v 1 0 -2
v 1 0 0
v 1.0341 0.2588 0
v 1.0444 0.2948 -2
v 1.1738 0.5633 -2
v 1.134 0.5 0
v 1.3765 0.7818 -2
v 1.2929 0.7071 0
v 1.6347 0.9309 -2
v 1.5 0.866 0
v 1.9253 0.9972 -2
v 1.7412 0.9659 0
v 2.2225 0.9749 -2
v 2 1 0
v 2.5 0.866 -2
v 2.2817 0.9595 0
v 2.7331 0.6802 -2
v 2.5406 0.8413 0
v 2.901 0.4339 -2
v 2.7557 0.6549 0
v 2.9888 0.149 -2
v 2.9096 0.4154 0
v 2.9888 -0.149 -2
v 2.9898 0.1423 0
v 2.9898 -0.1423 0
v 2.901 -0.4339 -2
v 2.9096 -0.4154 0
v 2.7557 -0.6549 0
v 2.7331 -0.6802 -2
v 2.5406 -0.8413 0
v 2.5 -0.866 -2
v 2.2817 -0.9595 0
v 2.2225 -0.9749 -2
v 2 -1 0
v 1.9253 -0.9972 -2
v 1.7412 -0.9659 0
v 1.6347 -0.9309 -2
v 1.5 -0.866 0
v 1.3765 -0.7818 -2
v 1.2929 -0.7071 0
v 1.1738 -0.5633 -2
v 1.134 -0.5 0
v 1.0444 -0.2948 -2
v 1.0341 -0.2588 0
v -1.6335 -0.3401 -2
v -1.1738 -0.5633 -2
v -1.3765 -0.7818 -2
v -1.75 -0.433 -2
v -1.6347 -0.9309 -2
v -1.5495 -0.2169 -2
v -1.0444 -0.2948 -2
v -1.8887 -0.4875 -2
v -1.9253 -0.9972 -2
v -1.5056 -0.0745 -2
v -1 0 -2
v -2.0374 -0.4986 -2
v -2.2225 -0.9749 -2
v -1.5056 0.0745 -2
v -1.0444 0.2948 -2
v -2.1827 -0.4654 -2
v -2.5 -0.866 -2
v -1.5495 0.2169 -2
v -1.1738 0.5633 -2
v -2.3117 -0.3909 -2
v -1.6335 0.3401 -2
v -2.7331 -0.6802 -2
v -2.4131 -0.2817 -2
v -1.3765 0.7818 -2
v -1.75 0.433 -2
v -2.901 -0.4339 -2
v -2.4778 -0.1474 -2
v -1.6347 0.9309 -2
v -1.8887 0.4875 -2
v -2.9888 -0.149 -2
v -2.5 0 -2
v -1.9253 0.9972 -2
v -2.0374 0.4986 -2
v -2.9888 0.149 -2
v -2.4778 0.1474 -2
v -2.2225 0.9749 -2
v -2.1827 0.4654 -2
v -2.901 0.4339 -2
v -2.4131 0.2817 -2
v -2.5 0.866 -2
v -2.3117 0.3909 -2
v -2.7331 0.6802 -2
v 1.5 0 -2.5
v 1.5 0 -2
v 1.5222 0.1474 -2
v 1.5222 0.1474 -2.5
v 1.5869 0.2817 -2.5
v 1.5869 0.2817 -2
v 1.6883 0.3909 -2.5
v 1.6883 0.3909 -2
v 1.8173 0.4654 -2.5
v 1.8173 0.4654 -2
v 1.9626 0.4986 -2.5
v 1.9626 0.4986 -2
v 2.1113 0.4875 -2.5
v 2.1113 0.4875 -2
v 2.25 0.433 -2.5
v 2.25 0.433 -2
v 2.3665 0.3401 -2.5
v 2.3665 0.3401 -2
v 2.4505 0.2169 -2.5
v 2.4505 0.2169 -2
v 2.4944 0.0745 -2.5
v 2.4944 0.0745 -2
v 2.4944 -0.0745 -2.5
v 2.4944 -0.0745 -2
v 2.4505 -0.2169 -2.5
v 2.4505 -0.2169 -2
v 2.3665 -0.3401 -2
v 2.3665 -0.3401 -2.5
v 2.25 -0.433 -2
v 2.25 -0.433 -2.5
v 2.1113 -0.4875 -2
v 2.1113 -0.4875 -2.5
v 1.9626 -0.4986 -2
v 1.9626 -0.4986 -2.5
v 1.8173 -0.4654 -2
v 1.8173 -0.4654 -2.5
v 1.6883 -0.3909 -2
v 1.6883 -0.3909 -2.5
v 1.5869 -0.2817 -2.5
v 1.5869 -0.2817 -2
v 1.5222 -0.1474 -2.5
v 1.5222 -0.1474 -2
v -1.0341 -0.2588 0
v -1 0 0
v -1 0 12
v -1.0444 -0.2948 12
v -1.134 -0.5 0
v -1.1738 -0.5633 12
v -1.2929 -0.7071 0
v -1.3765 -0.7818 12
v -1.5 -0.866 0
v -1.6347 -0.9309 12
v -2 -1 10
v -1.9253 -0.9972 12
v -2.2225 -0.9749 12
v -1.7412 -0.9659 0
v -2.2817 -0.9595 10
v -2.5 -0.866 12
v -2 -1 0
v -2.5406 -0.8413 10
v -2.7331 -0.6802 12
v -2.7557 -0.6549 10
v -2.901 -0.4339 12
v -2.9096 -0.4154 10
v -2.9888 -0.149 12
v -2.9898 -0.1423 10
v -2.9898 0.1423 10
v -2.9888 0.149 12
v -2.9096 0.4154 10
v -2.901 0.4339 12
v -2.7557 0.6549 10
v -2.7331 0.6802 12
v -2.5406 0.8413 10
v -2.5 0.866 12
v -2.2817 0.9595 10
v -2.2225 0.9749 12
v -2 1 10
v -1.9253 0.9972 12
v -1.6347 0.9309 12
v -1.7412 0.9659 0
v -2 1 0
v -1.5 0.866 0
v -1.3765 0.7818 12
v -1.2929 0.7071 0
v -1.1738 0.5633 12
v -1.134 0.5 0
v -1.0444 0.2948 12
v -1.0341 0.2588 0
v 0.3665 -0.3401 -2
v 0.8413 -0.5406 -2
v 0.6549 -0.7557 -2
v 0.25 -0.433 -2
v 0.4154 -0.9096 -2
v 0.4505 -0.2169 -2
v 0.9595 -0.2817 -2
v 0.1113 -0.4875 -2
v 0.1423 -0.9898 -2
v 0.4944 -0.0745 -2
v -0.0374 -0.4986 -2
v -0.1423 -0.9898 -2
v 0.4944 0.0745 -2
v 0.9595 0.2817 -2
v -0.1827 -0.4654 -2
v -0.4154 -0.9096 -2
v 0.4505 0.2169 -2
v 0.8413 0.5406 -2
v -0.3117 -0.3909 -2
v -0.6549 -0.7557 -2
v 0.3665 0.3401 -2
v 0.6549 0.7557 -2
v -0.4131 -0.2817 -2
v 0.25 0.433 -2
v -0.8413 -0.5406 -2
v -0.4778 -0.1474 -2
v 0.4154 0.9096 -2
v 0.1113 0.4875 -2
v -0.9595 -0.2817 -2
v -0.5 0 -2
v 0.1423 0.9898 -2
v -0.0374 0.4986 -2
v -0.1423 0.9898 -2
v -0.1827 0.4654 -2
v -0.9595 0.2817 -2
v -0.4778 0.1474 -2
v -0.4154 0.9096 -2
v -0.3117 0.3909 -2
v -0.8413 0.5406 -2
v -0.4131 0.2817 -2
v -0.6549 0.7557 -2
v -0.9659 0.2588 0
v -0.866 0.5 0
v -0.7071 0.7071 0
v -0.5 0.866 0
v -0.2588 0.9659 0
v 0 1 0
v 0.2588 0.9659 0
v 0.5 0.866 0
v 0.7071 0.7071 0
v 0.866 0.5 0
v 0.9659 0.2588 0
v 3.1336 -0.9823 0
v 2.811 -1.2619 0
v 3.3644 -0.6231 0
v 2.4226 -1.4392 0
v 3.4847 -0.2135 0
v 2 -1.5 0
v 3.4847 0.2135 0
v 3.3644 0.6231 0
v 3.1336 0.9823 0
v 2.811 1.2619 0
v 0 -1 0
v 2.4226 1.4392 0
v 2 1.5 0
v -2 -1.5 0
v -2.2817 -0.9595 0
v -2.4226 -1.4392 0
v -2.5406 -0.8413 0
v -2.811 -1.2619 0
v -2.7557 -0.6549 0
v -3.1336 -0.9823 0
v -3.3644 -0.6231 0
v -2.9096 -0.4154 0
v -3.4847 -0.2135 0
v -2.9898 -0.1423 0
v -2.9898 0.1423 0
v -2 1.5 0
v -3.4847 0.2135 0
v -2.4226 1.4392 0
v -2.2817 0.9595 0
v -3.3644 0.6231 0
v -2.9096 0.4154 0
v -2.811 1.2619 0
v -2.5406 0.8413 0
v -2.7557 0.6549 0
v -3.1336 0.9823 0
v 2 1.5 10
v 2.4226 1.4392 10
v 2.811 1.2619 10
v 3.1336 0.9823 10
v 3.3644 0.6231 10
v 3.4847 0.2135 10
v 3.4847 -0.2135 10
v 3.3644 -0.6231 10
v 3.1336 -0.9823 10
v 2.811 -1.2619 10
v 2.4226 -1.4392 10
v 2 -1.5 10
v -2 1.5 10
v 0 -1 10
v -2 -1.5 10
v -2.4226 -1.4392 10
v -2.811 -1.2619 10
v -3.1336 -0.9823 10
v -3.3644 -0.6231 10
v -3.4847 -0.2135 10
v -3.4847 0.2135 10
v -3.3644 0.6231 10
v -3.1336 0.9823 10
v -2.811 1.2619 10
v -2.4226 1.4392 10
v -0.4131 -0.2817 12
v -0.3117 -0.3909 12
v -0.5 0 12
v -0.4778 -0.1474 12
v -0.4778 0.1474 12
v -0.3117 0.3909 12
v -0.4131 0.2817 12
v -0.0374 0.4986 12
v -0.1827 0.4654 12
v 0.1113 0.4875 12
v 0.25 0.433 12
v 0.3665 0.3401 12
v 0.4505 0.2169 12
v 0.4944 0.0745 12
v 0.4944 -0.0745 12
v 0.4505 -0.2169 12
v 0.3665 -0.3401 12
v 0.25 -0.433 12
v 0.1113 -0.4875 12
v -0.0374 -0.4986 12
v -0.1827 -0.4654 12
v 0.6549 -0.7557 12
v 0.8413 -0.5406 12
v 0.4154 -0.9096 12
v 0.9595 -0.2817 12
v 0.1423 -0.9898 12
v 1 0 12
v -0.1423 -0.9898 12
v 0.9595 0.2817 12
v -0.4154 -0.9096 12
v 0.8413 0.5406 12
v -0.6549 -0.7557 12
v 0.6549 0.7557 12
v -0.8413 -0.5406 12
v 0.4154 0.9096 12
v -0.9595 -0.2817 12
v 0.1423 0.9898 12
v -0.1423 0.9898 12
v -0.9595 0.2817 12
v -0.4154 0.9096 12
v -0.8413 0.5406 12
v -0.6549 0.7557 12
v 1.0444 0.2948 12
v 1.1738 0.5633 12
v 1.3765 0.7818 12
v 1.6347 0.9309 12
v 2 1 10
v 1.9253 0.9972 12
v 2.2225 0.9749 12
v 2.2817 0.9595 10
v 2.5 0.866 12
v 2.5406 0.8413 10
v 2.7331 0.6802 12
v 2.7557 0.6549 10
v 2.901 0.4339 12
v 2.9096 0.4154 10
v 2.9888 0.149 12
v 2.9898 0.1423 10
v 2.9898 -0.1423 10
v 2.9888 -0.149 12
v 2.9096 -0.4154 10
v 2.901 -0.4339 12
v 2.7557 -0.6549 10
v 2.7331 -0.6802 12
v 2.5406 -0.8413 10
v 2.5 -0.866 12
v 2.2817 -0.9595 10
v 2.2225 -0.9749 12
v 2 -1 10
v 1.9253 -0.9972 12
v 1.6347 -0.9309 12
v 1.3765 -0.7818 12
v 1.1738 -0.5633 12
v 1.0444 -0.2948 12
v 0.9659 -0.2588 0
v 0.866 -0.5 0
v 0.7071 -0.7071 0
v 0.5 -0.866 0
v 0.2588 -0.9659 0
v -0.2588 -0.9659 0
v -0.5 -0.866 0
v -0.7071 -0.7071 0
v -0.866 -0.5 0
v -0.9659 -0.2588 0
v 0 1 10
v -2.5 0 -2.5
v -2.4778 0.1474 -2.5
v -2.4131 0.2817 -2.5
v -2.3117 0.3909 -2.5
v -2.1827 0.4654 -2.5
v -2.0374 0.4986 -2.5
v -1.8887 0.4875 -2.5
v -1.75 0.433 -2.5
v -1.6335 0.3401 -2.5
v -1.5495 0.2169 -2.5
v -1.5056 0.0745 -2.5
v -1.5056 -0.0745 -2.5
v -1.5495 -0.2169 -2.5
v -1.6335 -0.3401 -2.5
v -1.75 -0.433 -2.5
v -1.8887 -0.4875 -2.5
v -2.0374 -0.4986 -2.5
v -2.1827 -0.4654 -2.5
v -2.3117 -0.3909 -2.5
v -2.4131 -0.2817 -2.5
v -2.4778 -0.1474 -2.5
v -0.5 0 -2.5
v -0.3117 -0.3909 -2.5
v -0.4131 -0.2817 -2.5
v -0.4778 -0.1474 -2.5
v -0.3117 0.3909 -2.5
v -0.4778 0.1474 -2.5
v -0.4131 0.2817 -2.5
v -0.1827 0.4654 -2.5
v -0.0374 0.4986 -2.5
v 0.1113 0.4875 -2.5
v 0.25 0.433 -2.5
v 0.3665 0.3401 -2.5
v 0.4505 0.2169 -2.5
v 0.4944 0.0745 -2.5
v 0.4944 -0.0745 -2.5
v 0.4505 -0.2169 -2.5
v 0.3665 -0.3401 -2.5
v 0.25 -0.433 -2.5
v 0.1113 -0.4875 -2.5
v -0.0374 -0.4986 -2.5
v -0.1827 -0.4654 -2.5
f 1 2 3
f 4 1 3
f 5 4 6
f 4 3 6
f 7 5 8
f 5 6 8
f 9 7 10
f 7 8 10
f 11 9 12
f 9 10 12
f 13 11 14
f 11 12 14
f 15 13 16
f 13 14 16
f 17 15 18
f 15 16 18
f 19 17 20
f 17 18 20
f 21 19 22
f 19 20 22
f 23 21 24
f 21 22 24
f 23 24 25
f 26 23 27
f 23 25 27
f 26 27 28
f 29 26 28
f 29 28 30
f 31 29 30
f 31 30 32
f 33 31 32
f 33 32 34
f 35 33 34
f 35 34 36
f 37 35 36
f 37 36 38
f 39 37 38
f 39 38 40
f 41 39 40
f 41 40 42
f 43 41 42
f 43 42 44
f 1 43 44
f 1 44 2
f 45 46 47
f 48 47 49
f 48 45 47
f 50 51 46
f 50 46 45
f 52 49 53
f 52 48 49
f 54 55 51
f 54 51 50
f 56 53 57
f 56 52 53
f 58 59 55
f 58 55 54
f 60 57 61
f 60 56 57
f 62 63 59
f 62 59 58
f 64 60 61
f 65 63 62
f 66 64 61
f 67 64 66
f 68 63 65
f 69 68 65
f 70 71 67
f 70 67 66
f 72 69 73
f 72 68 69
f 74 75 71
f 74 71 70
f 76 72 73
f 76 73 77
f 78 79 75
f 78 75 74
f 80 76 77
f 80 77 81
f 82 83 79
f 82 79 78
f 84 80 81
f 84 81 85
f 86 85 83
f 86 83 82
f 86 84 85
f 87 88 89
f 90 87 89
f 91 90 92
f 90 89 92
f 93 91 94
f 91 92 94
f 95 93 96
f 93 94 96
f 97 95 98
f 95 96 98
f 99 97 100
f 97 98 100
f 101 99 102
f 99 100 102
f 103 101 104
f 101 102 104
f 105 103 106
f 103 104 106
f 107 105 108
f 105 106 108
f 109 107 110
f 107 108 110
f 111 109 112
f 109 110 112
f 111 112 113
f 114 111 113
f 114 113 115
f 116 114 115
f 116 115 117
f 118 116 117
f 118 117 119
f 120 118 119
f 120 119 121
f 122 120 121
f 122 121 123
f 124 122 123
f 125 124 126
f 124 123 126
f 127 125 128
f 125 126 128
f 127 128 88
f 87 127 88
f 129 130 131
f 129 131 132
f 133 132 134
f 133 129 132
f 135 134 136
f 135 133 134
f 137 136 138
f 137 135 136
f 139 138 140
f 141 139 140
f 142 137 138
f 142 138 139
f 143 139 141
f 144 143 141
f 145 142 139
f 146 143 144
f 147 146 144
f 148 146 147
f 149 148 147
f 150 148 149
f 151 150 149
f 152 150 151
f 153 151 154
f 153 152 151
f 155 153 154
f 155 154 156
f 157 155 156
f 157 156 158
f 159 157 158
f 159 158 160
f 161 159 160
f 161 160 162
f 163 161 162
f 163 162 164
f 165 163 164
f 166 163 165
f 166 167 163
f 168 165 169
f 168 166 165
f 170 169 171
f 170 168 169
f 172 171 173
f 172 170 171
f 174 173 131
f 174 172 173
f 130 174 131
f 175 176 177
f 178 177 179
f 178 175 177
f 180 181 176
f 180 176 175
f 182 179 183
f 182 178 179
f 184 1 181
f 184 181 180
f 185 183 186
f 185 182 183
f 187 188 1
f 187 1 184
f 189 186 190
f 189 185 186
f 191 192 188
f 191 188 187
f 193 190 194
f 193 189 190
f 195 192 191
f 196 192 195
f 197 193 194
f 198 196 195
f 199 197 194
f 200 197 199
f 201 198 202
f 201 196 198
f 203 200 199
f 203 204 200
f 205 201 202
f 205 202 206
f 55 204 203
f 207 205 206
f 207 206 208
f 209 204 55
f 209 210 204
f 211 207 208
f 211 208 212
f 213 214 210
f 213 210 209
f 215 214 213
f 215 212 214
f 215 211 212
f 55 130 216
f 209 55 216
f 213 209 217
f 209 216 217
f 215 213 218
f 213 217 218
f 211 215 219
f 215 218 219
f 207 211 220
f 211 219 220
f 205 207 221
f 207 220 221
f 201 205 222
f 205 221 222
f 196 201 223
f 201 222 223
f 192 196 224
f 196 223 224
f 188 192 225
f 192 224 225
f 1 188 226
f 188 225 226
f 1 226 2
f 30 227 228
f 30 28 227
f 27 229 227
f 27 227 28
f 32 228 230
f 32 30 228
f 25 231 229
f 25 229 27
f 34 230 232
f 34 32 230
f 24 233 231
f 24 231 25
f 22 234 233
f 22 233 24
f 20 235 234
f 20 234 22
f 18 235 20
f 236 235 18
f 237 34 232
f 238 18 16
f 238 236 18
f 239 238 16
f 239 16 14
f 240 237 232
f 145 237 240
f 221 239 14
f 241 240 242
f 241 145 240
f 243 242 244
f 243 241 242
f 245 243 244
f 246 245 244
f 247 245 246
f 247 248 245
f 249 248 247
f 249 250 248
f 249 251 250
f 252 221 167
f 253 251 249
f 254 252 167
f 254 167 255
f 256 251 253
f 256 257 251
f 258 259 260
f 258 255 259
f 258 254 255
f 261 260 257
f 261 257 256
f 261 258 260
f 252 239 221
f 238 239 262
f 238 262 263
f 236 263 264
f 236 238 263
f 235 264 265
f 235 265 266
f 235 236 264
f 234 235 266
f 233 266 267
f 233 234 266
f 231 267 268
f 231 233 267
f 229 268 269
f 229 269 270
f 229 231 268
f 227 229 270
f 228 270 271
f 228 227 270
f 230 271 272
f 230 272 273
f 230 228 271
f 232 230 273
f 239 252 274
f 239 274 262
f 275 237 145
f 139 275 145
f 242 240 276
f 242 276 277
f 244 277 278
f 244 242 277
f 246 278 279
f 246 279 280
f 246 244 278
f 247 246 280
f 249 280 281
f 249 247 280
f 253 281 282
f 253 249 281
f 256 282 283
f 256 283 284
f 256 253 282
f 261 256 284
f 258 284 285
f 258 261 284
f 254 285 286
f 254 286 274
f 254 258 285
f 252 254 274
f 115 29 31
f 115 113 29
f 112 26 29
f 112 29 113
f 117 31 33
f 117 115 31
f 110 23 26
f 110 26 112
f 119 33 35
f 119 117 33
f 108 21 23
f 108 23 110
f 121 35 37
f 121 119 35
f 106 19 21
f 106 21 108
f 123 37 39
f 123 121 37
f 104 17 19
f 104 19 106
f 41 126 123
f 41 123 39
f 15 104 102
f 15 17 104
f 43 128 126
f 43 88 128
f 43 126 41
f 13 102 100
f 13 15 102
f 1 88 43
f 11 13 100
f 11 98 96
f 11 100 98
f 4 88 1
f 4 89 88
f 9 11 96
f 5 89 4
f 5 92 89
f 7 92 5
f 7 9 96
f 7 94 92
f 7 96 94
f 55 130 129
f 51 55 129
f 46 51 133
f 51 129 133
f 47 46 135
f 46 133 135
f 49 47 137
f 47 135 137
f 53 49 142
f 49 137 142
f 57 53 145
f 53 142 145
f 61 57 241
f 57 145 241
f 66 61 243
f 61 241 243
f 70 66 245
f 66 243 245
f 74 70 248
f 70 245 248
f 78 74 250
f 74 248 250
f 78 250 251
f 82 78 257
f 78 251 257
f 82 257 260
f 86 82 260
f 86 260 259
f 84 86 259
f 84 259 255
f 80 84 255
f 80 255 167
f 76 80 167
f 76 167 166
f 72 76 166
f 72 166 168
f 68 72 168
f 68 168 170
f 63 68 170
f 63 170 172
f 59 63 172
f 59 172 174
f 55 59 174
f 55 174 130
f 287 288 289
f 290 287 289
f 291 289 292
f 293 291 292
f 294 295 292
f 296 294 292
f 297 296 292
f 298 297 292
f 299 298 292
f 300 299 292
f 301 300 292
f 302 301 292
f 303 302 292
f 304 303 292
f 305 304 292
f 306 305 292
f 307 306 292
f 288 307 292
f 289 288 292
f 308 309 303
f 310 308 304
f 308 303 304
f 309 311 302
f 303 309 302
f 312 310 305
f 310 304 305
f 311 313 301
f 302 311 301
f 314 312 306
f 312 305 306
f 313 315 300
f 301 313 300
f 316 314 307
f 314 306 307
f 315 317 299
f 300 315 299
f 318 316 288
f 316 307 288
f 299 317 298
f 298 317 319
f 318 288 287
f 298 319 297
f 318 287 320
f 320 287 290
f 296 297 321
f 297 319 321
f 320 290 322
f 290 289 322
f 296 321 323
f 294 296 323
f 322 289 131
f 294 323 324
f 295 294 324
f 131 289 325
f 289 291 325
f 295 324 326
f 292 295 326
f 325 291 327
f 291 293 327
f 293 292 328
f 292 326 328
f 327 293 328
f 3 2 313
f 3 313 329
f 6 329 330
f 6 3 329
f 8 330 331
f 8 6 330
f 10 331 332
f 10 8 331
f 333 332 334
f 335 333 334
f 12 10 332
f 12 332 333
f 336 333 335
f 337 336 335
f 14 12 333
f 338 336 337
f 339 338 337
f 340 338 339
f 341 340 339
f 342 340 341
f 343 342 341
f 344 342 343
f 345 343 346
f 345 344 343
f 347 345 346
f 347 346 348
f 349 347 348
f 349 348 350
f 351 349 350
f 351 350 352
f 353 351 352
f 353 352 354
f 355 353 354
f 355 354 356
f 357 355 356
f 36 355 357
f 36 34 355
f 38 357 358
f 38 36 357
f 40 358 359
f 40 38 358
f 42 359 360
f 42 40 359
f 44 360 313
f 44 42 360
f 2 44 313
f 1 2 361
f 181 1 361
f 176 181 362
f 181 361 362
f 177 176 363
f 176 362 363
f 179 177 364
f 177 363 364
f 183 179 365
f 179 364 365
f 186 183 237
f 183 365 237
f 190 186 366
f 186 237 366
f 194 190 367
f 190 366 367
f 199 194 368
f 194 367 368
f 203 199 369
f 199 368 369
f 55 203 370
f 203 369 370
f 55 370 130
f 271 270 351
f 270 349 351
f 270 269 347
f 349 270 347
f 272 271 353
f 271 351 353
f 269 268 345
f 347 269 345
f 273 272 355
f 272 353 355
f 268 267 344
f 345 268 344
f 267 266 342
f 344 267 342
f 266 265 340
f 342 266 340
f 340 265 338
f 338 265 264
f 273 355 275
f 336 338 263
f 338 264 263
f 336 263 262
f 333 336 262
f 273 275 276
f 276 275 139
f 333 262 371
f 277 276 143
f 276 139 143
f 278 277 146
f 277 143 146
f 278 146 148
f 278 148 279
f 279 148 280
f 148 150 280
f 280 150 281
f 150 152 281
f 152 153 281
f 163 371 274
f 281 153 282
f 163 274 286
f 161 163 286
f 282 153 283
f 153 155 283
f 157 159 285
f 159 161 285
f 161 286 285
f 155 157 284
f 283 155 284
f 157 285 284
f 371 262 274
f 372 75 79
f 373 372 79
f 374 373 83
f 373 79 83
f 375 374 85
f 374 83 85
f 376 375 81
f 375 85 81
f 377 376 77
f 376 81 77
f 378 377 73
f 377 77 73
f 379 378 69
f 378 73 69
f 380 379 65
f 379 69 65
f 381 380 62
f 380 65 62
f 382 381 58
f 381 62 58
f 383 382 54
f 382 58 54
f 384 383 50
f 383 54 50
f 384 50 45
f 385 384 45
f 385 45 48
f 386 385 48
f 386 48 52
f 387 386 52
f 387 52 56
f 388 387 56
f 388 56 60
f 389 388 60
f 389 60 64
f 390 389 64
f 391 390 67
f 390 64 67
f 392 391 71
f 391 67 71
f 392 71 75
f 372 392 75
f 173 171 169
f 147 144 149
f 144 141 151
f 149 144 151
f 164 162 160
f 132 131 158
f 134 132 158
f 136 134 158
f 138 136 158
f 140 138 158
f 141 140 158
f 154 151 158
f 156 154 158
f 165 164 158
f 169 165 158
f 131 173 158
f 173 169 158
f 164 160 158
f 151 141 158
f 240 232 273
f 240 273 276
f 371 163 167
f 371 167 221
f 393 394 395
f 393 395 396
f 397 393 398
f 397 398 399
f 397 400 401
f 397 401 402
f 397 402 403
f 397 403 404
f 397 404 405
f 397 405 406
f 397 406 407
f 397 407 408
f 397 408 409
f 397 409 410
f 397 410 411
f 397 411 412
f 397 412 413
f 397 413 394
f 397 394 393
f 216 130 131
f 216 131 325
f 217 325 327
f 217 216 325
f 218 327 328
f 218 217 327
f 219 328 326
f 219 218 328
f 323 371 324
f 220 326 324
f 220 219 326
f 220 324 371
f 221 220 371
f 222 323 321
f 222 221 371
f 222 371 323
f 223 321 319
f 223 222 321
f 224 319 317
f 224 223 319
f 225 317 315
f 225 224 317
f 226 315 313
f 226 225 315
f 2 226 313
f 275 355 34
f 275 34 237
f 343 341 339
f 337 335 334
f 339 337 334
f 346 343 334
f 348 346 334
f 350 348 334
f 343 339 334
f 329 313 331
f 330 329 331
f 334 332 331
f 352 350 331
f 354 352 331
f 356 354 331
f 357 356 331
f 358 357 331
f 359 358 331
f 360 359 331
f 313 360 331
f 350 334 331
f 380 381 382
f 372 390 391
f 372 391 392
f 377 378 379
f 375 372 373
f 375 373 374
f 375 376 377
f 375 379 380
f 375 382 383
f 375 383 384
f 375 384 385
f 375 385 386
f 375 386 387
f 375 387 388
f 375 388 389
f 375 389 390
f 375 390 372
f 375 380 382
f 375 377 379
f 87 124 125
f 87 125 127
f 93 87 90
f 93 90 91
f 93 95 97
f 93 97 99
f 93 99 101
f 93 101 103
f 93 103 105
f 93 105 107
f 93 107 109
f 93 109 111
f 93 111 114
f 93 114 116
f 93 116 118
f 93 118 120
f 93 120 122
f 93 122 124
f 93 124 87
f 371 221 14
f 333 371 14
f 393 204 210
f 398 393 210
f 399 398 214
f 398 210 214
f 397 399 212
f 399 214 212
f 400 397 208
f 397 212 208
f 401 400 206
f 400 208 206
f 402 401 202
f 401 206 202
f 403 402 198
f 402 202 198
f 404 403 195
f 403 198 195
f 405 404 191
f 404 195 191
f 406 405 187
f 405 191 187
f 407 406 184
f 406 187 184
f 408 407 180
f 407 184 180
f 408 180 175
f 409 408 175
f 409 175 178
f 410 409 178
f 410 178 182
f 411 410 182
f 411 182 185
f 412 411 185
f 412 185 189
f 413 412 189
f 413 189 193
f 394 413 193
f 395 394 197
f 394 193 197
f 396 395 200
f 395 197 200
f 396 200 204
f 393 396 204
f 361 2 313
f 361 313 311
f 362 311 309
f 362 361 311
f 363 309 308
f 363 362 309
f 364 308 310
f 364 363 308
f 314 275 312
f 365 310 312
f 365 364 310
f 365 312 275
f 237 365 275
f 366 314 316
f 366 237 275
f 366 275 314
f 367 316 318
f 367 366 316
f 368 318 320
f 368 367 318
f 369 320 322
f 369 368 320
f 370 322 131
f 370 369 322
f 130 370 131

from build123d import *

# Parameters (mm, degrees)
EXTRUDE_THIN1_DEPTH      = 10
SKETCH2_R                = 1
SKETCH2_R_2              = 0.5
EXTRUDE_THIN2_DEPTH      = 2
EXTRUDE_THIN2_DEPTH_BACK = 12
SKETCH3_R                = 0.5
BOSS_EXTRUDE1_DEPTH      = 0.5
BOSS_EXTRUDE1_DEPTH_BACK = 14


with BuildPart() as part:
    # Sketch1 → Extrude-Thin1 (new body)
    with BuildSketch(Plane.XY):
        with BuildLine():
            Line((2, -1.5), (-2, -1.5))
            ThreePointArc((-2, -1.5), (-3.5, 0), (-2, 1.5))
            Line((-2, 1.5), (2, 1.5))
            ThreePointArc((2, 1.5), (3.5, 0), (2, -1.5))
        make_face()
        with BuildLine():
            Line((2, -1), (-2, -1))
            ThreePointArc((-2, -1), (-3, 0), (-2, 1))
            Line((-2, 1), (2, 1))
            ThreePointArc((2, 1), (3, 0), (2, -1))
        make_face(mode=Mode.SUBTRACT)
    extrude(amount=EXTRUDE_THIN1_DEPTH)

    # Sketch2 → Extrude-Thin2 (add, two sides)
    with BuildSketch(Plane(origin=(0, 0, 0), x_dir=(-1, 0, 0), z_dir=(0, 0, -1))) as extrude_thin2_sk:
        Circle(SKETCH2_R)
        Circle(SKETCH2_R_2, mode=Mode.SUBTRACT)
        with Locations((2, 0)):
            Circle(SKETCH2_R)
        with Locations((2, 0)):
            Circle(SKETCH2_R_2, mode=Mode.SUBTRACT)
        with Locations((-2, 0)):
            Circle(SKETCH2_R)
        with Locations((-2, 0)):
            Circle(SKETCH2_R_2, mode=Mode.SUBTRACT)
    extrude(amount=EXTRUDE_THIN2_DEPTH)
    extrude(extrude_thin2_sk.sketch, amount=-EXTRUDE_THIN2_DEPTH_BACK)

    # Sketch3 → Boss-Extrude1 (add, two sides)
    with BuildSketch(Plane(origin=(0, 0, -2), x_dir=(-1, 0, 0), z_dir=(0, 0, -1))) as boss_extrude1_sk:
        with Locations((-2, 0)):
            Circle(SKETCH3_R)
        Circle(SKETCH3_R)
        with Locations((2, 0)):
            Circle(SKETCH3_R)
    extrude(amount=BOSS_EXTRUDE1_DEPTH)
    extrude(boss_extrude1_sk.sketch, amount=-BOSS_EXTRUDE1_DEPTH_BACK)


solid = part.part
